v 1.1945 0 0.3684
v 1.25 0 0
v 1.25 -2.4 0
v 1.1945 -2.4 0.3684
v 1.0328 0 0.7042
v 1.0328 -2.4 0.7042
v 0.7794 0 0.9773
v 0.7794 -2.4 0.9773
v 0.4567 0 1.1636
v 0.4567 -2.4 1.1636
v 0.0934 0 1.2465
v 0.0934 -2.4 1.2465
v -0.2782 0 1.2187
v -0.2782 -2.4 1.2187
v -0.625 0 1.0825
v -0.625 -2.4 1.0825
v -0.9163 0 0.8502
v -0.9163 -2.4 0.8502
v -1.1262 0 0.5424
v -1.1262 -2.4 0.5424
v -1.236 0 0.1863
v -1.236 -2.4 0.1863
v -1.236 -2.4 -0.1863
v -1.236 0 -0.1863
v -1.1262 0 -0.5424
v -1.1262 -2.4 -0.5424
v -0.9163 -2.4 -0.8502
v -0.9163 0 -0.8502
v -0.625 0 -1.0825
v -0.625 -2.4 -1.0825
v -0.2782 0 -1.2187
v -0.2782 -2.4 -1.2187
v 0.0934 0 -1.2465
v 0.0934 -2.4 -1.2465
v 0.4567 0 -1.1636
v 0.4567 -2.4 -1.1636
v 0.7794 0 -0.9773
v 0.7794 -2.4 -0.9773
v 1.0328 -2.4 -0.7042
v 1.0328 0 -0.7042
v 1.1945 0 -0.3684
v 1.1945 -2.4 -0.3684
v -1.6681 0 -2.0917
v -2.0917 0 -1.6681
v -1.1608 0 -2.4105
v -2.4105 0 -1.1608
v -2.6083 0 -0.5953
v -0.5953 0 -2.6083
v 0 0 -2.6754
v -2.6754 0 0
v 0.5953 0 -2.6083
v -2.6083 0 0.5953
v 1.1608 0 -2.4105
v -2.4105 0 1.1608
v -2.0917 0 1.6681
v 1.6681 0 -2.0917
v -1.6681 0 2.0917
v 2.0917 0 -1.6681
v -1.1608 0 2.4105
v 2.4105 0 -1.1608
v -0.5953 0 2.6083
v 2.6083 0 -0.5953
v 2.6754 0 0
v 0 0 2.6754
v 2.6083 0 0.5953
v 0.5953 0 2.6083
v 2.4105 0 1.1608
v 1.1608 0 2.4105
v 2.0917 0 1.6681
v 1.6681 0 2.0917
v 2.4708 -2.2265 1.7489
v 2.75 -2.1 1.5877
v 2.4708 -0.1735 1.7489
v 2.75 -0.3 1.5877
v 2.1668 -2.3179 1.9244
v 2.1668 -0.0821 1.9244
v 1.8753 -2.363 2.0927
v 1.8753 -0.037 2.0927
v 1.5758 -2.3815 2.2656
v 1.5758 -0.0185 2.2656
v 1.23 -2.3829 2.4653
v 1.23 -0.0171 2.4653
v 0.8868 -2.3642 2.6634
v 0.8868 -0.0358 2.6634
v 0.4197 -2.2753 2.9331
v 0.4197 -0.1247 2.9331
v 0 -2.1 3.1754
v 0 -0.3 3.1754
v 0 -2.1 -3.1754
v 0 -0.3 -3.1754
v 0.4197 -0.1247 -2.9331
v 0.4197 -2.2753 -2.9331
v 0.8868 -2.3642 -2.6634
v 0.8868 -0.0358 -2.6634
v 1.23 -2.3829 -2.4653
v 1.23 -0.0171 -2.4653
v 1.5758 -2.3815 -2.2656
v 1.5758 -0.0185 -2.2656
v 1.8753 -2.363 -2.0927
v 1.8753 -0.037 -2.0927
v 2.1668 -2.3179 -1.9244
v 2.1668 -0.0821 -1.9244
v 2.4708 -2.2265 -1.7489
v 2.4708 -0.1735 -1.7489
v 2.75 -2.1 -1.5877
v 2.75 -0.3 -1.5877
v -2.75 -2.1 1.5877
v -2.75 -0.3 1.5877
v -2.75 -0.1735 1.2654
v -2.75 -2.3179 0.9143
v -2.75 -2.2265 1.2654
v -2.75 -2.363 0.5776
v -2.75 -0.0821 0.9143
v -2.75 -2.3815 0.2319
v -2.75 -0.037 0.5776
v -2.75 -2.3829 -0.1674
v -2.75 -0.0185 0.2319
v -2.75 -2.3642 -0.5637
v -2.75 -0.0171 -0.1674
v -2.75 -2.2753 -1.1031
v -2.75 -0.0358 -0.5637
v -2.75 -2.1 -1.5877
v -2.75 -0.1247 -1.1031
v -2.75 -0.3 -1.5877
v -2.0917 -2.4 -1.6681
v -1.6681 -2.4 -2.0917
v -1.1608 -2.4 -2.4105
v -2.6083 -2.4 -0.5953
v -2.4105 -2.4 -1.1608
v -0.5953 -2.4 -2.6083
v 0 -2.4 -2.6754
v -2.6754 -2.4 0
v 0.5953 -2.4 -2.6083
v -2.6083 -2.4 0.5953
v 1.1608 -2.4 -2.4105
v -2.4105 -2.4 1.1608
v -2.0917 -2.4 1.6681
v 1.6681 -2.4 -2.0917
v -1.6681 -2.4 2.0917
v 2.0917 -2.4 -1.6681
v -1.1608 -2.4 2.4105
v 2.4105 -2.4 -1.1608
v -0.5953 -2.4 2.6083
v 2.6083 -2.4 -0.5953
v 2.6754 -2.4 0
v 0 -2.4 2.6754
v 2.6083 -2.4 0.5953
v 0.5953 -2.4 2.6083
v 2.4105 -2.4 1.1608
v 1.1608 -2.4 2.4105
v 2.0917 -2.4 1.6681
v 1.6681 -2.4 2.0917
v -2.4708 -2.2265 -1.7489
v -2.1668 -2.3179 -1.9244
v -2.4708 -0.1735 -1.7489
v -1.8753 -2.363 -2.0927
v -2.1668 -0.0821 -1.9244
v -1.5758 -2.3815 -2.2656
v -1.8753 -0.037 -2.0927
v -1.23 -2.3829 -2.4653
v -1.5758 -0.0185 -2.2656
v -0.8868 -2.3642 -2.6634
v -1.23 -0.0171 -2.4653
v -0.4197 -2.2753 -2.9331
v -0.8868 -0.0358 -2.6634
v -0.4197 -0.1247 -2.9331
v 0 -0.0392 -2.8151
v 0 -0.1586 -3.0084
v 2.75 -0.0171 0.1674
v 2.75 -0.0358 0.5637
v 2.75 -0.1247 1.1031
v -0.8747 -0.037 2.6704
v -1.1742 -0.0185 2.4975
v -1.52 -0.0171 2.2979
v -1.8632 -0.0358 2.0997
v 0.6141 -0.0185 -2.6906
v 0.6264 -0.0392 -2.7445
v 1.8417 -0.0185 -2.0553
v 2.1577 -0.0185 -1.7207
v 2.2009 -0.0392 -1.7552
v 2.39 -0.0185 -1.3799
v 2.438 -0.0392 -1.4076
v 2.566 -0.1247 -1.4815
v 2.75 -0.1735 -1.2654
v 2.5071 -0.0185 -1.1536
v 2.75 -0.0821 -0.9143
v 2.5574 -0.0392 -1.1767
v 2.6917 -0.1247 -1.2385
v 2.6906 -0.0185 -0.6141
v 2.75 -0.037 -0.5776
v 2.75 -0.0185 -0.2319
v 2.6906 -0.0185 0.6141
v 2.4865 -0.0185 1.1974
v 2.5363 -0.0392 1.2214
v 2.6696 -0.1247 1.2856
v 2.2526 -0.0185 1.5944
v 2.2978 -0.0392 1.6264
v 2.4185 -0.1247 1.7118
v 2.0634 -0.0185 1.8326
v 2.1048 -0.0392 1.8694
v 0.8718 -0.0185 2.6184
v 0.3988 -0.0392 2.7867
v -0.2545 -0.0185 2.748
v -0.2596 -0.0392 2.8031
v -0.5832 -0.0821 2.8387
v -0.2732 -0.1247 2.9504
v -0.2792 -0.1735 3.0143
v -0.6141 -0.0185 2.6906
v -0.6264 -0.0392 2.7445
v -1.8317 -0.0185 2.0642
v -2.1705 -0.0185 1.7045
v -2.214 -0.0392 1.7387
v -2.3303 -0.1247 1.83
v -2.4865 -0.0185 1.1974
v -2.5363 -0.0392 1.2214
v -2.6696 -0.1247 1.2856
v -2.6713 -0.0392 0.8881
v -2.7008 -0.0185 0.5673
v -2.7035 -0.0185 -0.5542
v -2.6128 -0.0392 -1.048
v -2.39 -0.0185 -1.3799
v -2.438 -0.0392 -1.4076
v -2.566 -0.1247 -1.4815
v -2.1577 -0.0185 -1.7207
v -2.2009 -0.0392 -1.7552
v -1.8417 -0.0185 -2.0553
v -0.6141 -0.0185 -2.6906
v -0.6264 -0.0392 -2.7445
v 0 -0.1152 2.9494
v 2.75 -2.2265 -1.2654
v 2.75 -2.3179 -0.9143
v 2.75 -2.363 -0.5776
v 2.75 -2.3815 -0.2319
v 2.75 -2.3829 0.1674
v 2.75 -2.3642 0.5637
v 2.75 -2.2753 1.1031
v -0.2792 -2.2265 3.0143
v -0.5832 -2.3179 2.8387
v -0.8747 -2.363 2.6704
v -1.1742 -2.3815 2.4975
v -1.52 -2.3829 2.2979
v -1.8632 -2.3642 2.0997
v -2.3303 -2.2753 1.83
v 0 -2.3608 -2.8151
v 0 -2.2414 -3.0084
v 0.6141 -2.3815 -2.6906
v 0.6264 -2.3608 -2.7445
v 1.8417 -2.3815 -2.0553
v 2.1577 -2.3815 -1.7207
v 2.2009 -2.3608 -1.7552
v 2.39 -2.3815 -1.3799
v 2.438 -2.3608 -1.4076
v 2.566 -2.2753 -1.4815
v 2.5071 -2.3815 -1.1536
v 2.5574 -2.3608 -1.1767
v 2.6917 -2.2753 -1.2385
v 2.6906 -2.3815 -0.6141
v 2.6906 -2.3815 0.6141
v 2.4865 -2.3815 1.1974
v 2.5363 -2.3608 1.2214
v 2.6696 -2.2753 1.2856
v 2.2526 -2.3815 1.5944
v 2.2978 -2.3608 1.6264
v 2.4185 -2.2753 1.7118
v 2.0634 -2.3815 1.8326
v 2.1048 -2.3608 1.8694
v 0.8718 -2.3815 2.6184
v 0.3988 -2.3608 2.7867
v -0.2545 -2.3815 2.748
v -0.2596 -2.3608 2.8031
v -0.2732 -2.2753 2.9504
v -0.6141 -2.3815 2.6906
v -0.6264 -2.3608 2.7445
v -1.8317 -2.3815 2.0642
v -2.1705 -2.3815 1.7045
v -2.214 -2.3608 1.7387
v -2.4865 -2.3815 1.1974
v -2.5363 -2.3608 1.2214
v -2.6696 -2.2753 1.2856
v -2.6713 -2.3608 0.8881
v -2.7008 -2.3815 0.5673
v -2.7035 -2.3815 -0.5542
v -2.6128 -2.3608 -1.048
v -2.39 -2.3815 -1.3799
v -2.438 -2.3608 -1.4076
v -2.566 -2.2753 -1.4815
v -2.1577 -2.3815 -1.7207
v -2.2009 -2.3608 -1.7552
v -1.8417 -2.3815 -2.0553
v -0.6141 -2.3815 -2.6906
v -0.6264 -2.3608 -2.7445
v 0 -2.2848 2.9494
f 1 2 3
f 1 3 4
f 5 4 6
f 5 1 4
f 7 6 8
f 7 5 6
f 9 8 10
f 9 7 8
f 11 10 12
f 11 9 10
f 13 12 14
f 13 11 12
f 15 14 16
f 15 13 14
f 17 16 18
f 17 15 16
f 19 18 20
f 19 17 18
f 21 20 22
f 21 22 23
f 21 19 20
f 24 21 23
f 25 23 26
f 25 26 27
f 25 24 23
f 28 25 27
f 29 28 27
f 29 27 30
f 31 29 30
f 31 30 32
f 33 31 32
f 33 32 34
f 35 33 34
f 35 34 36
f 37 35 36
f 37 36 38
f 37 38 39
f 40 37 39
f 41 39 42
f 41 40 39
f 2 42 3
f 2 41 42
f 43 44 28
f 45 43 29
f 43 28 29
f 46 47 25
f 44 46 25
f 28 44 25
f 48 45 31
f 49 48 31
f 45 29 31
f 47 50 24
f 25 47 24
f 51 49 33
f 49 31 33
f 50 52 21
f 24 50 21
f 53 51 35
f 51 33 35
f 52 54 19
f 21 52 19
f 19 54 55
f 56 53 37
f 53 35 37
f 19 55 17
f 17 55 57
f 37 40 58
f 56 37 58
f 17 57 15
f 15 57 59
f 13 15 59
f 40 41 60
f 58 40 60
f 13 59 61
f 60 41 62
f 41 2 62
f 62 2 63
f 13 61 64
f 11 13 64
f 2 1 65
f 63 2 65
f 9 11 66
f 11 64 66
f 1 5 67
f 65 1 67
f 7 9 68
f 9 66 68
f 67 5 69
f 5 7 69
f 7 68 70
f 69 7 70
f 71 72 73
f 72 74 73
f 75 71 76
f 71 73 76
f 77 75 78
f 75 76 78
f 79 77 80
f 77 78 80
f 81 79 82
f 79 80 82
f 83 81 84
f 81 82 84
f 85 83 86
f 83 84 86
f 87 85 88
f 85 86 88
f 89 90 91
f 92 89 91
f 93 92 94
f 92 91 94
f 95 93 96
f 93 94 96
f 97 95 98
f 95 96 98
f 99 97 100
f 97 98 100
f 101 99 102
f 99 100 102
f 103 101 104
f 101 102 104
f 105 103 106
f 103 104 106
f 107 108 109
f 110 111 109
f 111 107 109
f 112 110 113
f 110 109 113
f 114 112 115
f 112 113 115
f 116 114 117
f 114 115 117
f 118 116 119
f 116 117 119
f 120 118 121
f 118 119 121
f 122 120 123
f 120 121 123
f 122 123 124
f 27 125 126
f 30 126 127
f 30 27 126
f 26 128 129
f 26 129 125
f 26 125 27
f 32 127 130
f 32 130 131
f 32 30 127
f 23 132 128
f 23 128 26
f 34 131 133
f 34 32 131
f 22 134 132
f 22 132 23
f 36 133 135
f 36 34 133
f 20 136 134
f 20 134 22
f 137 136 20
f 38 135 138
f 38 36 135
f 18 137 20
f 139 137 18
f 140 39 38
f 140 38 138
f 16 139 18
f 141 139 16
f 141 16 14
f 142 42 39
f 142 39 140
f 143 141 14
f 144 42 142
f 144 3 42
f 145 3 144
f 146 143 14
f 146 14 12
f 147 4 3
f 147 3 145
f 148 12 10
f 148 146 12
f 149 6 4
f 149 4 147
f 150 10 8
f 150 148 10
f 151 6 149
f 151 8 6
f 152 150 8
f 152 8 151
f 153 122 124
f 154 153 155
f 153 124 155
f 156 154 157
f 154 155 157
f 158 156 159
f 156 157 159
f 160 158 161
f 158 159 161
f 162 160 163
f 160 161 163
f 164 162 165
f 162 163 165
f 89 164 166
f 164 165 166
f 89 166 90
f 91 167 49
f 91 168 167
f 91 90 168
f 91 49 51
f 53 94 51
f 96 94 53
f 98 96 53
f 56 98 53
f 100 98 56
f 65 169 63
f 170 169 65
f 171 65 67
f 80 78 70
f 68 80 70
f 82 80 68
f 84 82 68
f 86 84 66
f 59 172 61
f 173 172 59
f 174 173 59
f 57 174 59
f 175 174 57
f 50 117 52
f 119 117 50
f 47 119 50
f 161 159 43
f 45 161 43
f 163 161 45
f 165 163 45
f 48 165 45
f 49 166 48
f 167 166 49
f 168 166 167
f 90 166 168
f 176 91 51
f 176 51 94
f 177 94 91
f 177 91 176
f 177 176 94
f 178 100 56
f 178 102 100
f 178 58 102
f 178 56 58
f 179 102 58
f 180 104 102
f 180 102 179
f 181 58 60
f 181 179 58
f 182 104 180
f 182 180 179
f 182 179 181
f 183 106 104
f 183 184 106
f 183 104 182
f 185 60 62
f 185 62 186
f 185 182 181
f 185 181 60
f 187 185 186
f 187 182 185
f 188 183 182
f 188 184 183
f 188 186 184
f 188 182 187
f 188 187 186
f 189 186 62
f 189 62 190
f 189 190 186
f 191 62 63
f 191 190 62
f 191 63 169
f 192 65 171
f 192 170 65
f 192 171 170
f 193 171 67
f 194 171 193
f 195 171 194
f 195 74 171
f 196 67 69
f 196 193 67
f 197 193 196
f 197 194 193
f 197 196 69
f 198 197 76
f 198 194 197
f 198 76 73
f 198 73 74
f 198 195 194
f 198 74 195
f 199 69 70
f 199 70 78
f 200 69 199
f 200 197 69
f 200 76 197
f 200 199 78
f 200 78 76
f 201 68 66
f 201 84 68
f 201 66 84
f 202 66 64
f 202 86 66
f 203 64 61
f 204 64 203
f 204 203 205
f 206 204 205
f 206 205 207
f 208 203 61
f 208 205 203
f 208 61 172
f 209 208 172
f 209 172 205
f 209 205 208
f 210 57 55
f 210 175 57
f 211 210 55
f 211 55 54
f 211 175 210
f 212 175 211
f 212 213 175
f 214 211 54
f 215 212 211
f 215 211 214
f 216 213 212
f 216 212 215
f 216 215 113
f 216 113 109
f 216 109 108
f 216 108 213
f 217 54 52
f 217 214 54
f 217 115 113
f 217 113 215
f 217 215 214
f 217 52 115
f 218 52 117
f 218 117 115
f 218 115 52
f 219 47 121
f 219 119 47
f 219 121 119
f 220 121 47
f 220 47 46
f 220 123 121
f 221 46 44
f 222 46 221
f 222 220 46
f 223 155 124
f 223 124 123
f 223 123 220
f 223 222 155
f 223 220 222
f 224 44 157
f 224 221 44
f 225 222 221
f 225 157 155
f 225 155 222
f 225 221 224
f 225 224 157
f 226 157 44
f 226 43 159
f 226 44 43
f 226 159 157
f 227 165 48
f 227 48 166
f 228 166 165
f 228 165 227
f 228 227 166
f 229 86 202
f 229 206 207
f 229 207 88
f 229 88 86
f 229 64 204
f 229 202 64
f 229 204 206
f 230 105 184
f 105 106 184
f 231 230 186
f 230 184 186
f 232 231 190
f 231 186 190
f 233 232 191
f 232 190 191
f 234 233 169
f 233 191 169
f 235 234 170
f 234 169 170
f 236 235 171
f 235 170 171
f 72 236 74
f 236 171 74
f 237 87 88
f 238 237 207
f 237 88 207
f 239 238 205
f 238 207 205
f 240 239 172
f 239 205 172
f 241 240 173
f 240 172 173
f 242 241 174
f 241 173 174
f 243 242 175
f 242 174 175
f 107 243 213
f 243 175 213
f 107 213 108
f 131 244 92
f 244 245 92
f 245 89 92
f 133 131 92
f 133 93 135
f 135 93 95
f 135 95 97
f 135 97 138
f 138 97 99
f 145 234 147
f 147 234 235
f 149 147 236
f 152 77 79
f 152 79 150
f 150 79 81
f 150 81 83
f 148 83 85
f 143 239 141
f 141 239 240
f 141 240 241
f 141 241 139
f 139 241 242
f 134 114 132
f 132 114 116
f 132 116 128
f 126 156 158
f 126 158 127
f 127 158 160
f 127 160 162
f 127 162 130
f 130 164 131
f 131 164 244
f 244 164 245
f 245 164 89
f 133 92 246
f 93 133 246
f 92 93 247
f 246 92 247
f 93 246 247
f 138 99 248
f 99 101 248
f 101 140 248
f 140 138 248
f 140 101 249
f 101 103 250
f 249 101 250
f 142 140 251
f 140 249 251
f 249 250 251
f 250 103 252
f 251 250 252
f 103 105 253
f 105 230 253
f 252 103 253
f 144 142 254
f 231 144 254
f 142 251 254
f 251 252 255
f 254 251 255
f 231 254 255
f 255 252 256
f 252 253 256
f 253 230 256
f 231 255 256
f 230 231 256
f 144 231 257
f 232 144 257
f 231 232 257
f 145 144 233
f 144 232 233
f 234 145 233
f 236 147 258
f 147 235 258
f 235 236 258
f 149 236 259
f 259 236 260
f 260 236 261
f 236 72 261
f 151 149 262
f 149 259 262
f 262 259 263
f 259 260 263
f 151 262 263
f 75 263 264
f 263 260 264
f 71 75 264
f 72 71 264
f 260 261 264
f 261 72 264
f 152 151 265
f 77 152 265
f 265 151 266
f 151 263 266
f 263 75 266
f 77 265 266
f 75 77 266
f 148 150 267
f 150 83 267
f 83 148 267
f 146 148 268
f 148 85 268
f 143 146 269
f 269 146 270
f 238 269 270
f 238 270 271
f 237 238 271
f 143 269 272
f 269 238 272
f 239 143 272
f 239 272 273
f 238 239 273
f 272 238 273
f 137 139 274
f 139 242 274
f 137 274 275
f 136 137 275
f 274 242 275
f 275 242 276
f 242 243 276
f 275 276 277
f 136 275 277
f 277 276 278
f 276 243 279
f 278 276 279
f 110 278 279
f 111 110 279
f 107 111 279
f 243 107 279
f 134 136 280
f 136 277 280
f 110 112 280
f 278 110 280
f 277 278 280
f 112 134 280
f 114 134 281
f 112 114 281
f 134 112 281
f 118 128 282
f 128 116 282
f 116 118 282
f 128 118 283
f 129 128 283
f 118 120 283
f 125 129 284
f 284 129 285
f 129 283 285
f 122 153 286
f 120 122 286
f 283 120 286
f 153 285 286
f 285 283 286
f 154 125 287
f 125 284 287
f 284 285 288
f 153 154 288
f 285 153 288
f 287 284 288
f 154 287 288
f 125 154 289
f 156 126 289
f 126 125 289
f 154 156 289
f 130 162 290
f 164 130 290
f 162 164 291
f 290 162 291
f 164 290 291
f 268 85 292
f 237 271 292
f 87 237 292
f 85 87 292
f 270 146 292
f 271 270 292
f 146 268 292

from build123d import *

# Parameters (mm, degrees)
F0_R     = 1.25
F1_DEPTH = 2.4


with BuildPart() as f1:
    # F0 (on Front) → F1 (new body)
    with BuildSketch(Plane.XZ):
        Polygon((2.75, -1.587713), (2.75, 1.587713), (0, 3.175426), (-2.75, 1.587713), (-2.75, -1.587713), (0, -3.175426), align=None)
        Circle(F0_R, mode=Mode.SUBTRACT)
    extrude(amount=F1_DEPTH)

    # F2 (on Right) → F3 (revolve, cut)
    with BuildSketch(Plane.YZ):
        with BuildLine():
            add(Edge.make_bspline(
                [(0, -2.675426), (-0.024953, -2.876037), (-0.182256, -3.038666), (-0.3, -3.175426)],
                knots=[0, 0, 0, 0, 0.583095, 0.583095, 0.583095, 0.583095], degree=3))
            Line((-0.3, -3.175426), (0, -3.175426))
            Line((0, -3.175426), (0, -2.675426))
        make_face()
        with BuildLine():
            Line((-2.4, -3.175426), (-2.1, -3.175426))
            add(Edge.make_bspline(
                [(-2.4, -2.675426), (-2.375047, -2.876037), (-2.217744, -3.038666), (-2.1, -3.175426)],
                knots=[0, 0, 0, 0, 0.583095, 0.583095, 0.583095, 0.583095], degree=3))
            Line((-2.4, -2.675426), (-2.4, -3.175426))
        make_face()
    revolve(axis=Axis((0, -1.2, 0), (0, -1, 0)), mode=Mode.SUBTRACT)


solid = f1.part
